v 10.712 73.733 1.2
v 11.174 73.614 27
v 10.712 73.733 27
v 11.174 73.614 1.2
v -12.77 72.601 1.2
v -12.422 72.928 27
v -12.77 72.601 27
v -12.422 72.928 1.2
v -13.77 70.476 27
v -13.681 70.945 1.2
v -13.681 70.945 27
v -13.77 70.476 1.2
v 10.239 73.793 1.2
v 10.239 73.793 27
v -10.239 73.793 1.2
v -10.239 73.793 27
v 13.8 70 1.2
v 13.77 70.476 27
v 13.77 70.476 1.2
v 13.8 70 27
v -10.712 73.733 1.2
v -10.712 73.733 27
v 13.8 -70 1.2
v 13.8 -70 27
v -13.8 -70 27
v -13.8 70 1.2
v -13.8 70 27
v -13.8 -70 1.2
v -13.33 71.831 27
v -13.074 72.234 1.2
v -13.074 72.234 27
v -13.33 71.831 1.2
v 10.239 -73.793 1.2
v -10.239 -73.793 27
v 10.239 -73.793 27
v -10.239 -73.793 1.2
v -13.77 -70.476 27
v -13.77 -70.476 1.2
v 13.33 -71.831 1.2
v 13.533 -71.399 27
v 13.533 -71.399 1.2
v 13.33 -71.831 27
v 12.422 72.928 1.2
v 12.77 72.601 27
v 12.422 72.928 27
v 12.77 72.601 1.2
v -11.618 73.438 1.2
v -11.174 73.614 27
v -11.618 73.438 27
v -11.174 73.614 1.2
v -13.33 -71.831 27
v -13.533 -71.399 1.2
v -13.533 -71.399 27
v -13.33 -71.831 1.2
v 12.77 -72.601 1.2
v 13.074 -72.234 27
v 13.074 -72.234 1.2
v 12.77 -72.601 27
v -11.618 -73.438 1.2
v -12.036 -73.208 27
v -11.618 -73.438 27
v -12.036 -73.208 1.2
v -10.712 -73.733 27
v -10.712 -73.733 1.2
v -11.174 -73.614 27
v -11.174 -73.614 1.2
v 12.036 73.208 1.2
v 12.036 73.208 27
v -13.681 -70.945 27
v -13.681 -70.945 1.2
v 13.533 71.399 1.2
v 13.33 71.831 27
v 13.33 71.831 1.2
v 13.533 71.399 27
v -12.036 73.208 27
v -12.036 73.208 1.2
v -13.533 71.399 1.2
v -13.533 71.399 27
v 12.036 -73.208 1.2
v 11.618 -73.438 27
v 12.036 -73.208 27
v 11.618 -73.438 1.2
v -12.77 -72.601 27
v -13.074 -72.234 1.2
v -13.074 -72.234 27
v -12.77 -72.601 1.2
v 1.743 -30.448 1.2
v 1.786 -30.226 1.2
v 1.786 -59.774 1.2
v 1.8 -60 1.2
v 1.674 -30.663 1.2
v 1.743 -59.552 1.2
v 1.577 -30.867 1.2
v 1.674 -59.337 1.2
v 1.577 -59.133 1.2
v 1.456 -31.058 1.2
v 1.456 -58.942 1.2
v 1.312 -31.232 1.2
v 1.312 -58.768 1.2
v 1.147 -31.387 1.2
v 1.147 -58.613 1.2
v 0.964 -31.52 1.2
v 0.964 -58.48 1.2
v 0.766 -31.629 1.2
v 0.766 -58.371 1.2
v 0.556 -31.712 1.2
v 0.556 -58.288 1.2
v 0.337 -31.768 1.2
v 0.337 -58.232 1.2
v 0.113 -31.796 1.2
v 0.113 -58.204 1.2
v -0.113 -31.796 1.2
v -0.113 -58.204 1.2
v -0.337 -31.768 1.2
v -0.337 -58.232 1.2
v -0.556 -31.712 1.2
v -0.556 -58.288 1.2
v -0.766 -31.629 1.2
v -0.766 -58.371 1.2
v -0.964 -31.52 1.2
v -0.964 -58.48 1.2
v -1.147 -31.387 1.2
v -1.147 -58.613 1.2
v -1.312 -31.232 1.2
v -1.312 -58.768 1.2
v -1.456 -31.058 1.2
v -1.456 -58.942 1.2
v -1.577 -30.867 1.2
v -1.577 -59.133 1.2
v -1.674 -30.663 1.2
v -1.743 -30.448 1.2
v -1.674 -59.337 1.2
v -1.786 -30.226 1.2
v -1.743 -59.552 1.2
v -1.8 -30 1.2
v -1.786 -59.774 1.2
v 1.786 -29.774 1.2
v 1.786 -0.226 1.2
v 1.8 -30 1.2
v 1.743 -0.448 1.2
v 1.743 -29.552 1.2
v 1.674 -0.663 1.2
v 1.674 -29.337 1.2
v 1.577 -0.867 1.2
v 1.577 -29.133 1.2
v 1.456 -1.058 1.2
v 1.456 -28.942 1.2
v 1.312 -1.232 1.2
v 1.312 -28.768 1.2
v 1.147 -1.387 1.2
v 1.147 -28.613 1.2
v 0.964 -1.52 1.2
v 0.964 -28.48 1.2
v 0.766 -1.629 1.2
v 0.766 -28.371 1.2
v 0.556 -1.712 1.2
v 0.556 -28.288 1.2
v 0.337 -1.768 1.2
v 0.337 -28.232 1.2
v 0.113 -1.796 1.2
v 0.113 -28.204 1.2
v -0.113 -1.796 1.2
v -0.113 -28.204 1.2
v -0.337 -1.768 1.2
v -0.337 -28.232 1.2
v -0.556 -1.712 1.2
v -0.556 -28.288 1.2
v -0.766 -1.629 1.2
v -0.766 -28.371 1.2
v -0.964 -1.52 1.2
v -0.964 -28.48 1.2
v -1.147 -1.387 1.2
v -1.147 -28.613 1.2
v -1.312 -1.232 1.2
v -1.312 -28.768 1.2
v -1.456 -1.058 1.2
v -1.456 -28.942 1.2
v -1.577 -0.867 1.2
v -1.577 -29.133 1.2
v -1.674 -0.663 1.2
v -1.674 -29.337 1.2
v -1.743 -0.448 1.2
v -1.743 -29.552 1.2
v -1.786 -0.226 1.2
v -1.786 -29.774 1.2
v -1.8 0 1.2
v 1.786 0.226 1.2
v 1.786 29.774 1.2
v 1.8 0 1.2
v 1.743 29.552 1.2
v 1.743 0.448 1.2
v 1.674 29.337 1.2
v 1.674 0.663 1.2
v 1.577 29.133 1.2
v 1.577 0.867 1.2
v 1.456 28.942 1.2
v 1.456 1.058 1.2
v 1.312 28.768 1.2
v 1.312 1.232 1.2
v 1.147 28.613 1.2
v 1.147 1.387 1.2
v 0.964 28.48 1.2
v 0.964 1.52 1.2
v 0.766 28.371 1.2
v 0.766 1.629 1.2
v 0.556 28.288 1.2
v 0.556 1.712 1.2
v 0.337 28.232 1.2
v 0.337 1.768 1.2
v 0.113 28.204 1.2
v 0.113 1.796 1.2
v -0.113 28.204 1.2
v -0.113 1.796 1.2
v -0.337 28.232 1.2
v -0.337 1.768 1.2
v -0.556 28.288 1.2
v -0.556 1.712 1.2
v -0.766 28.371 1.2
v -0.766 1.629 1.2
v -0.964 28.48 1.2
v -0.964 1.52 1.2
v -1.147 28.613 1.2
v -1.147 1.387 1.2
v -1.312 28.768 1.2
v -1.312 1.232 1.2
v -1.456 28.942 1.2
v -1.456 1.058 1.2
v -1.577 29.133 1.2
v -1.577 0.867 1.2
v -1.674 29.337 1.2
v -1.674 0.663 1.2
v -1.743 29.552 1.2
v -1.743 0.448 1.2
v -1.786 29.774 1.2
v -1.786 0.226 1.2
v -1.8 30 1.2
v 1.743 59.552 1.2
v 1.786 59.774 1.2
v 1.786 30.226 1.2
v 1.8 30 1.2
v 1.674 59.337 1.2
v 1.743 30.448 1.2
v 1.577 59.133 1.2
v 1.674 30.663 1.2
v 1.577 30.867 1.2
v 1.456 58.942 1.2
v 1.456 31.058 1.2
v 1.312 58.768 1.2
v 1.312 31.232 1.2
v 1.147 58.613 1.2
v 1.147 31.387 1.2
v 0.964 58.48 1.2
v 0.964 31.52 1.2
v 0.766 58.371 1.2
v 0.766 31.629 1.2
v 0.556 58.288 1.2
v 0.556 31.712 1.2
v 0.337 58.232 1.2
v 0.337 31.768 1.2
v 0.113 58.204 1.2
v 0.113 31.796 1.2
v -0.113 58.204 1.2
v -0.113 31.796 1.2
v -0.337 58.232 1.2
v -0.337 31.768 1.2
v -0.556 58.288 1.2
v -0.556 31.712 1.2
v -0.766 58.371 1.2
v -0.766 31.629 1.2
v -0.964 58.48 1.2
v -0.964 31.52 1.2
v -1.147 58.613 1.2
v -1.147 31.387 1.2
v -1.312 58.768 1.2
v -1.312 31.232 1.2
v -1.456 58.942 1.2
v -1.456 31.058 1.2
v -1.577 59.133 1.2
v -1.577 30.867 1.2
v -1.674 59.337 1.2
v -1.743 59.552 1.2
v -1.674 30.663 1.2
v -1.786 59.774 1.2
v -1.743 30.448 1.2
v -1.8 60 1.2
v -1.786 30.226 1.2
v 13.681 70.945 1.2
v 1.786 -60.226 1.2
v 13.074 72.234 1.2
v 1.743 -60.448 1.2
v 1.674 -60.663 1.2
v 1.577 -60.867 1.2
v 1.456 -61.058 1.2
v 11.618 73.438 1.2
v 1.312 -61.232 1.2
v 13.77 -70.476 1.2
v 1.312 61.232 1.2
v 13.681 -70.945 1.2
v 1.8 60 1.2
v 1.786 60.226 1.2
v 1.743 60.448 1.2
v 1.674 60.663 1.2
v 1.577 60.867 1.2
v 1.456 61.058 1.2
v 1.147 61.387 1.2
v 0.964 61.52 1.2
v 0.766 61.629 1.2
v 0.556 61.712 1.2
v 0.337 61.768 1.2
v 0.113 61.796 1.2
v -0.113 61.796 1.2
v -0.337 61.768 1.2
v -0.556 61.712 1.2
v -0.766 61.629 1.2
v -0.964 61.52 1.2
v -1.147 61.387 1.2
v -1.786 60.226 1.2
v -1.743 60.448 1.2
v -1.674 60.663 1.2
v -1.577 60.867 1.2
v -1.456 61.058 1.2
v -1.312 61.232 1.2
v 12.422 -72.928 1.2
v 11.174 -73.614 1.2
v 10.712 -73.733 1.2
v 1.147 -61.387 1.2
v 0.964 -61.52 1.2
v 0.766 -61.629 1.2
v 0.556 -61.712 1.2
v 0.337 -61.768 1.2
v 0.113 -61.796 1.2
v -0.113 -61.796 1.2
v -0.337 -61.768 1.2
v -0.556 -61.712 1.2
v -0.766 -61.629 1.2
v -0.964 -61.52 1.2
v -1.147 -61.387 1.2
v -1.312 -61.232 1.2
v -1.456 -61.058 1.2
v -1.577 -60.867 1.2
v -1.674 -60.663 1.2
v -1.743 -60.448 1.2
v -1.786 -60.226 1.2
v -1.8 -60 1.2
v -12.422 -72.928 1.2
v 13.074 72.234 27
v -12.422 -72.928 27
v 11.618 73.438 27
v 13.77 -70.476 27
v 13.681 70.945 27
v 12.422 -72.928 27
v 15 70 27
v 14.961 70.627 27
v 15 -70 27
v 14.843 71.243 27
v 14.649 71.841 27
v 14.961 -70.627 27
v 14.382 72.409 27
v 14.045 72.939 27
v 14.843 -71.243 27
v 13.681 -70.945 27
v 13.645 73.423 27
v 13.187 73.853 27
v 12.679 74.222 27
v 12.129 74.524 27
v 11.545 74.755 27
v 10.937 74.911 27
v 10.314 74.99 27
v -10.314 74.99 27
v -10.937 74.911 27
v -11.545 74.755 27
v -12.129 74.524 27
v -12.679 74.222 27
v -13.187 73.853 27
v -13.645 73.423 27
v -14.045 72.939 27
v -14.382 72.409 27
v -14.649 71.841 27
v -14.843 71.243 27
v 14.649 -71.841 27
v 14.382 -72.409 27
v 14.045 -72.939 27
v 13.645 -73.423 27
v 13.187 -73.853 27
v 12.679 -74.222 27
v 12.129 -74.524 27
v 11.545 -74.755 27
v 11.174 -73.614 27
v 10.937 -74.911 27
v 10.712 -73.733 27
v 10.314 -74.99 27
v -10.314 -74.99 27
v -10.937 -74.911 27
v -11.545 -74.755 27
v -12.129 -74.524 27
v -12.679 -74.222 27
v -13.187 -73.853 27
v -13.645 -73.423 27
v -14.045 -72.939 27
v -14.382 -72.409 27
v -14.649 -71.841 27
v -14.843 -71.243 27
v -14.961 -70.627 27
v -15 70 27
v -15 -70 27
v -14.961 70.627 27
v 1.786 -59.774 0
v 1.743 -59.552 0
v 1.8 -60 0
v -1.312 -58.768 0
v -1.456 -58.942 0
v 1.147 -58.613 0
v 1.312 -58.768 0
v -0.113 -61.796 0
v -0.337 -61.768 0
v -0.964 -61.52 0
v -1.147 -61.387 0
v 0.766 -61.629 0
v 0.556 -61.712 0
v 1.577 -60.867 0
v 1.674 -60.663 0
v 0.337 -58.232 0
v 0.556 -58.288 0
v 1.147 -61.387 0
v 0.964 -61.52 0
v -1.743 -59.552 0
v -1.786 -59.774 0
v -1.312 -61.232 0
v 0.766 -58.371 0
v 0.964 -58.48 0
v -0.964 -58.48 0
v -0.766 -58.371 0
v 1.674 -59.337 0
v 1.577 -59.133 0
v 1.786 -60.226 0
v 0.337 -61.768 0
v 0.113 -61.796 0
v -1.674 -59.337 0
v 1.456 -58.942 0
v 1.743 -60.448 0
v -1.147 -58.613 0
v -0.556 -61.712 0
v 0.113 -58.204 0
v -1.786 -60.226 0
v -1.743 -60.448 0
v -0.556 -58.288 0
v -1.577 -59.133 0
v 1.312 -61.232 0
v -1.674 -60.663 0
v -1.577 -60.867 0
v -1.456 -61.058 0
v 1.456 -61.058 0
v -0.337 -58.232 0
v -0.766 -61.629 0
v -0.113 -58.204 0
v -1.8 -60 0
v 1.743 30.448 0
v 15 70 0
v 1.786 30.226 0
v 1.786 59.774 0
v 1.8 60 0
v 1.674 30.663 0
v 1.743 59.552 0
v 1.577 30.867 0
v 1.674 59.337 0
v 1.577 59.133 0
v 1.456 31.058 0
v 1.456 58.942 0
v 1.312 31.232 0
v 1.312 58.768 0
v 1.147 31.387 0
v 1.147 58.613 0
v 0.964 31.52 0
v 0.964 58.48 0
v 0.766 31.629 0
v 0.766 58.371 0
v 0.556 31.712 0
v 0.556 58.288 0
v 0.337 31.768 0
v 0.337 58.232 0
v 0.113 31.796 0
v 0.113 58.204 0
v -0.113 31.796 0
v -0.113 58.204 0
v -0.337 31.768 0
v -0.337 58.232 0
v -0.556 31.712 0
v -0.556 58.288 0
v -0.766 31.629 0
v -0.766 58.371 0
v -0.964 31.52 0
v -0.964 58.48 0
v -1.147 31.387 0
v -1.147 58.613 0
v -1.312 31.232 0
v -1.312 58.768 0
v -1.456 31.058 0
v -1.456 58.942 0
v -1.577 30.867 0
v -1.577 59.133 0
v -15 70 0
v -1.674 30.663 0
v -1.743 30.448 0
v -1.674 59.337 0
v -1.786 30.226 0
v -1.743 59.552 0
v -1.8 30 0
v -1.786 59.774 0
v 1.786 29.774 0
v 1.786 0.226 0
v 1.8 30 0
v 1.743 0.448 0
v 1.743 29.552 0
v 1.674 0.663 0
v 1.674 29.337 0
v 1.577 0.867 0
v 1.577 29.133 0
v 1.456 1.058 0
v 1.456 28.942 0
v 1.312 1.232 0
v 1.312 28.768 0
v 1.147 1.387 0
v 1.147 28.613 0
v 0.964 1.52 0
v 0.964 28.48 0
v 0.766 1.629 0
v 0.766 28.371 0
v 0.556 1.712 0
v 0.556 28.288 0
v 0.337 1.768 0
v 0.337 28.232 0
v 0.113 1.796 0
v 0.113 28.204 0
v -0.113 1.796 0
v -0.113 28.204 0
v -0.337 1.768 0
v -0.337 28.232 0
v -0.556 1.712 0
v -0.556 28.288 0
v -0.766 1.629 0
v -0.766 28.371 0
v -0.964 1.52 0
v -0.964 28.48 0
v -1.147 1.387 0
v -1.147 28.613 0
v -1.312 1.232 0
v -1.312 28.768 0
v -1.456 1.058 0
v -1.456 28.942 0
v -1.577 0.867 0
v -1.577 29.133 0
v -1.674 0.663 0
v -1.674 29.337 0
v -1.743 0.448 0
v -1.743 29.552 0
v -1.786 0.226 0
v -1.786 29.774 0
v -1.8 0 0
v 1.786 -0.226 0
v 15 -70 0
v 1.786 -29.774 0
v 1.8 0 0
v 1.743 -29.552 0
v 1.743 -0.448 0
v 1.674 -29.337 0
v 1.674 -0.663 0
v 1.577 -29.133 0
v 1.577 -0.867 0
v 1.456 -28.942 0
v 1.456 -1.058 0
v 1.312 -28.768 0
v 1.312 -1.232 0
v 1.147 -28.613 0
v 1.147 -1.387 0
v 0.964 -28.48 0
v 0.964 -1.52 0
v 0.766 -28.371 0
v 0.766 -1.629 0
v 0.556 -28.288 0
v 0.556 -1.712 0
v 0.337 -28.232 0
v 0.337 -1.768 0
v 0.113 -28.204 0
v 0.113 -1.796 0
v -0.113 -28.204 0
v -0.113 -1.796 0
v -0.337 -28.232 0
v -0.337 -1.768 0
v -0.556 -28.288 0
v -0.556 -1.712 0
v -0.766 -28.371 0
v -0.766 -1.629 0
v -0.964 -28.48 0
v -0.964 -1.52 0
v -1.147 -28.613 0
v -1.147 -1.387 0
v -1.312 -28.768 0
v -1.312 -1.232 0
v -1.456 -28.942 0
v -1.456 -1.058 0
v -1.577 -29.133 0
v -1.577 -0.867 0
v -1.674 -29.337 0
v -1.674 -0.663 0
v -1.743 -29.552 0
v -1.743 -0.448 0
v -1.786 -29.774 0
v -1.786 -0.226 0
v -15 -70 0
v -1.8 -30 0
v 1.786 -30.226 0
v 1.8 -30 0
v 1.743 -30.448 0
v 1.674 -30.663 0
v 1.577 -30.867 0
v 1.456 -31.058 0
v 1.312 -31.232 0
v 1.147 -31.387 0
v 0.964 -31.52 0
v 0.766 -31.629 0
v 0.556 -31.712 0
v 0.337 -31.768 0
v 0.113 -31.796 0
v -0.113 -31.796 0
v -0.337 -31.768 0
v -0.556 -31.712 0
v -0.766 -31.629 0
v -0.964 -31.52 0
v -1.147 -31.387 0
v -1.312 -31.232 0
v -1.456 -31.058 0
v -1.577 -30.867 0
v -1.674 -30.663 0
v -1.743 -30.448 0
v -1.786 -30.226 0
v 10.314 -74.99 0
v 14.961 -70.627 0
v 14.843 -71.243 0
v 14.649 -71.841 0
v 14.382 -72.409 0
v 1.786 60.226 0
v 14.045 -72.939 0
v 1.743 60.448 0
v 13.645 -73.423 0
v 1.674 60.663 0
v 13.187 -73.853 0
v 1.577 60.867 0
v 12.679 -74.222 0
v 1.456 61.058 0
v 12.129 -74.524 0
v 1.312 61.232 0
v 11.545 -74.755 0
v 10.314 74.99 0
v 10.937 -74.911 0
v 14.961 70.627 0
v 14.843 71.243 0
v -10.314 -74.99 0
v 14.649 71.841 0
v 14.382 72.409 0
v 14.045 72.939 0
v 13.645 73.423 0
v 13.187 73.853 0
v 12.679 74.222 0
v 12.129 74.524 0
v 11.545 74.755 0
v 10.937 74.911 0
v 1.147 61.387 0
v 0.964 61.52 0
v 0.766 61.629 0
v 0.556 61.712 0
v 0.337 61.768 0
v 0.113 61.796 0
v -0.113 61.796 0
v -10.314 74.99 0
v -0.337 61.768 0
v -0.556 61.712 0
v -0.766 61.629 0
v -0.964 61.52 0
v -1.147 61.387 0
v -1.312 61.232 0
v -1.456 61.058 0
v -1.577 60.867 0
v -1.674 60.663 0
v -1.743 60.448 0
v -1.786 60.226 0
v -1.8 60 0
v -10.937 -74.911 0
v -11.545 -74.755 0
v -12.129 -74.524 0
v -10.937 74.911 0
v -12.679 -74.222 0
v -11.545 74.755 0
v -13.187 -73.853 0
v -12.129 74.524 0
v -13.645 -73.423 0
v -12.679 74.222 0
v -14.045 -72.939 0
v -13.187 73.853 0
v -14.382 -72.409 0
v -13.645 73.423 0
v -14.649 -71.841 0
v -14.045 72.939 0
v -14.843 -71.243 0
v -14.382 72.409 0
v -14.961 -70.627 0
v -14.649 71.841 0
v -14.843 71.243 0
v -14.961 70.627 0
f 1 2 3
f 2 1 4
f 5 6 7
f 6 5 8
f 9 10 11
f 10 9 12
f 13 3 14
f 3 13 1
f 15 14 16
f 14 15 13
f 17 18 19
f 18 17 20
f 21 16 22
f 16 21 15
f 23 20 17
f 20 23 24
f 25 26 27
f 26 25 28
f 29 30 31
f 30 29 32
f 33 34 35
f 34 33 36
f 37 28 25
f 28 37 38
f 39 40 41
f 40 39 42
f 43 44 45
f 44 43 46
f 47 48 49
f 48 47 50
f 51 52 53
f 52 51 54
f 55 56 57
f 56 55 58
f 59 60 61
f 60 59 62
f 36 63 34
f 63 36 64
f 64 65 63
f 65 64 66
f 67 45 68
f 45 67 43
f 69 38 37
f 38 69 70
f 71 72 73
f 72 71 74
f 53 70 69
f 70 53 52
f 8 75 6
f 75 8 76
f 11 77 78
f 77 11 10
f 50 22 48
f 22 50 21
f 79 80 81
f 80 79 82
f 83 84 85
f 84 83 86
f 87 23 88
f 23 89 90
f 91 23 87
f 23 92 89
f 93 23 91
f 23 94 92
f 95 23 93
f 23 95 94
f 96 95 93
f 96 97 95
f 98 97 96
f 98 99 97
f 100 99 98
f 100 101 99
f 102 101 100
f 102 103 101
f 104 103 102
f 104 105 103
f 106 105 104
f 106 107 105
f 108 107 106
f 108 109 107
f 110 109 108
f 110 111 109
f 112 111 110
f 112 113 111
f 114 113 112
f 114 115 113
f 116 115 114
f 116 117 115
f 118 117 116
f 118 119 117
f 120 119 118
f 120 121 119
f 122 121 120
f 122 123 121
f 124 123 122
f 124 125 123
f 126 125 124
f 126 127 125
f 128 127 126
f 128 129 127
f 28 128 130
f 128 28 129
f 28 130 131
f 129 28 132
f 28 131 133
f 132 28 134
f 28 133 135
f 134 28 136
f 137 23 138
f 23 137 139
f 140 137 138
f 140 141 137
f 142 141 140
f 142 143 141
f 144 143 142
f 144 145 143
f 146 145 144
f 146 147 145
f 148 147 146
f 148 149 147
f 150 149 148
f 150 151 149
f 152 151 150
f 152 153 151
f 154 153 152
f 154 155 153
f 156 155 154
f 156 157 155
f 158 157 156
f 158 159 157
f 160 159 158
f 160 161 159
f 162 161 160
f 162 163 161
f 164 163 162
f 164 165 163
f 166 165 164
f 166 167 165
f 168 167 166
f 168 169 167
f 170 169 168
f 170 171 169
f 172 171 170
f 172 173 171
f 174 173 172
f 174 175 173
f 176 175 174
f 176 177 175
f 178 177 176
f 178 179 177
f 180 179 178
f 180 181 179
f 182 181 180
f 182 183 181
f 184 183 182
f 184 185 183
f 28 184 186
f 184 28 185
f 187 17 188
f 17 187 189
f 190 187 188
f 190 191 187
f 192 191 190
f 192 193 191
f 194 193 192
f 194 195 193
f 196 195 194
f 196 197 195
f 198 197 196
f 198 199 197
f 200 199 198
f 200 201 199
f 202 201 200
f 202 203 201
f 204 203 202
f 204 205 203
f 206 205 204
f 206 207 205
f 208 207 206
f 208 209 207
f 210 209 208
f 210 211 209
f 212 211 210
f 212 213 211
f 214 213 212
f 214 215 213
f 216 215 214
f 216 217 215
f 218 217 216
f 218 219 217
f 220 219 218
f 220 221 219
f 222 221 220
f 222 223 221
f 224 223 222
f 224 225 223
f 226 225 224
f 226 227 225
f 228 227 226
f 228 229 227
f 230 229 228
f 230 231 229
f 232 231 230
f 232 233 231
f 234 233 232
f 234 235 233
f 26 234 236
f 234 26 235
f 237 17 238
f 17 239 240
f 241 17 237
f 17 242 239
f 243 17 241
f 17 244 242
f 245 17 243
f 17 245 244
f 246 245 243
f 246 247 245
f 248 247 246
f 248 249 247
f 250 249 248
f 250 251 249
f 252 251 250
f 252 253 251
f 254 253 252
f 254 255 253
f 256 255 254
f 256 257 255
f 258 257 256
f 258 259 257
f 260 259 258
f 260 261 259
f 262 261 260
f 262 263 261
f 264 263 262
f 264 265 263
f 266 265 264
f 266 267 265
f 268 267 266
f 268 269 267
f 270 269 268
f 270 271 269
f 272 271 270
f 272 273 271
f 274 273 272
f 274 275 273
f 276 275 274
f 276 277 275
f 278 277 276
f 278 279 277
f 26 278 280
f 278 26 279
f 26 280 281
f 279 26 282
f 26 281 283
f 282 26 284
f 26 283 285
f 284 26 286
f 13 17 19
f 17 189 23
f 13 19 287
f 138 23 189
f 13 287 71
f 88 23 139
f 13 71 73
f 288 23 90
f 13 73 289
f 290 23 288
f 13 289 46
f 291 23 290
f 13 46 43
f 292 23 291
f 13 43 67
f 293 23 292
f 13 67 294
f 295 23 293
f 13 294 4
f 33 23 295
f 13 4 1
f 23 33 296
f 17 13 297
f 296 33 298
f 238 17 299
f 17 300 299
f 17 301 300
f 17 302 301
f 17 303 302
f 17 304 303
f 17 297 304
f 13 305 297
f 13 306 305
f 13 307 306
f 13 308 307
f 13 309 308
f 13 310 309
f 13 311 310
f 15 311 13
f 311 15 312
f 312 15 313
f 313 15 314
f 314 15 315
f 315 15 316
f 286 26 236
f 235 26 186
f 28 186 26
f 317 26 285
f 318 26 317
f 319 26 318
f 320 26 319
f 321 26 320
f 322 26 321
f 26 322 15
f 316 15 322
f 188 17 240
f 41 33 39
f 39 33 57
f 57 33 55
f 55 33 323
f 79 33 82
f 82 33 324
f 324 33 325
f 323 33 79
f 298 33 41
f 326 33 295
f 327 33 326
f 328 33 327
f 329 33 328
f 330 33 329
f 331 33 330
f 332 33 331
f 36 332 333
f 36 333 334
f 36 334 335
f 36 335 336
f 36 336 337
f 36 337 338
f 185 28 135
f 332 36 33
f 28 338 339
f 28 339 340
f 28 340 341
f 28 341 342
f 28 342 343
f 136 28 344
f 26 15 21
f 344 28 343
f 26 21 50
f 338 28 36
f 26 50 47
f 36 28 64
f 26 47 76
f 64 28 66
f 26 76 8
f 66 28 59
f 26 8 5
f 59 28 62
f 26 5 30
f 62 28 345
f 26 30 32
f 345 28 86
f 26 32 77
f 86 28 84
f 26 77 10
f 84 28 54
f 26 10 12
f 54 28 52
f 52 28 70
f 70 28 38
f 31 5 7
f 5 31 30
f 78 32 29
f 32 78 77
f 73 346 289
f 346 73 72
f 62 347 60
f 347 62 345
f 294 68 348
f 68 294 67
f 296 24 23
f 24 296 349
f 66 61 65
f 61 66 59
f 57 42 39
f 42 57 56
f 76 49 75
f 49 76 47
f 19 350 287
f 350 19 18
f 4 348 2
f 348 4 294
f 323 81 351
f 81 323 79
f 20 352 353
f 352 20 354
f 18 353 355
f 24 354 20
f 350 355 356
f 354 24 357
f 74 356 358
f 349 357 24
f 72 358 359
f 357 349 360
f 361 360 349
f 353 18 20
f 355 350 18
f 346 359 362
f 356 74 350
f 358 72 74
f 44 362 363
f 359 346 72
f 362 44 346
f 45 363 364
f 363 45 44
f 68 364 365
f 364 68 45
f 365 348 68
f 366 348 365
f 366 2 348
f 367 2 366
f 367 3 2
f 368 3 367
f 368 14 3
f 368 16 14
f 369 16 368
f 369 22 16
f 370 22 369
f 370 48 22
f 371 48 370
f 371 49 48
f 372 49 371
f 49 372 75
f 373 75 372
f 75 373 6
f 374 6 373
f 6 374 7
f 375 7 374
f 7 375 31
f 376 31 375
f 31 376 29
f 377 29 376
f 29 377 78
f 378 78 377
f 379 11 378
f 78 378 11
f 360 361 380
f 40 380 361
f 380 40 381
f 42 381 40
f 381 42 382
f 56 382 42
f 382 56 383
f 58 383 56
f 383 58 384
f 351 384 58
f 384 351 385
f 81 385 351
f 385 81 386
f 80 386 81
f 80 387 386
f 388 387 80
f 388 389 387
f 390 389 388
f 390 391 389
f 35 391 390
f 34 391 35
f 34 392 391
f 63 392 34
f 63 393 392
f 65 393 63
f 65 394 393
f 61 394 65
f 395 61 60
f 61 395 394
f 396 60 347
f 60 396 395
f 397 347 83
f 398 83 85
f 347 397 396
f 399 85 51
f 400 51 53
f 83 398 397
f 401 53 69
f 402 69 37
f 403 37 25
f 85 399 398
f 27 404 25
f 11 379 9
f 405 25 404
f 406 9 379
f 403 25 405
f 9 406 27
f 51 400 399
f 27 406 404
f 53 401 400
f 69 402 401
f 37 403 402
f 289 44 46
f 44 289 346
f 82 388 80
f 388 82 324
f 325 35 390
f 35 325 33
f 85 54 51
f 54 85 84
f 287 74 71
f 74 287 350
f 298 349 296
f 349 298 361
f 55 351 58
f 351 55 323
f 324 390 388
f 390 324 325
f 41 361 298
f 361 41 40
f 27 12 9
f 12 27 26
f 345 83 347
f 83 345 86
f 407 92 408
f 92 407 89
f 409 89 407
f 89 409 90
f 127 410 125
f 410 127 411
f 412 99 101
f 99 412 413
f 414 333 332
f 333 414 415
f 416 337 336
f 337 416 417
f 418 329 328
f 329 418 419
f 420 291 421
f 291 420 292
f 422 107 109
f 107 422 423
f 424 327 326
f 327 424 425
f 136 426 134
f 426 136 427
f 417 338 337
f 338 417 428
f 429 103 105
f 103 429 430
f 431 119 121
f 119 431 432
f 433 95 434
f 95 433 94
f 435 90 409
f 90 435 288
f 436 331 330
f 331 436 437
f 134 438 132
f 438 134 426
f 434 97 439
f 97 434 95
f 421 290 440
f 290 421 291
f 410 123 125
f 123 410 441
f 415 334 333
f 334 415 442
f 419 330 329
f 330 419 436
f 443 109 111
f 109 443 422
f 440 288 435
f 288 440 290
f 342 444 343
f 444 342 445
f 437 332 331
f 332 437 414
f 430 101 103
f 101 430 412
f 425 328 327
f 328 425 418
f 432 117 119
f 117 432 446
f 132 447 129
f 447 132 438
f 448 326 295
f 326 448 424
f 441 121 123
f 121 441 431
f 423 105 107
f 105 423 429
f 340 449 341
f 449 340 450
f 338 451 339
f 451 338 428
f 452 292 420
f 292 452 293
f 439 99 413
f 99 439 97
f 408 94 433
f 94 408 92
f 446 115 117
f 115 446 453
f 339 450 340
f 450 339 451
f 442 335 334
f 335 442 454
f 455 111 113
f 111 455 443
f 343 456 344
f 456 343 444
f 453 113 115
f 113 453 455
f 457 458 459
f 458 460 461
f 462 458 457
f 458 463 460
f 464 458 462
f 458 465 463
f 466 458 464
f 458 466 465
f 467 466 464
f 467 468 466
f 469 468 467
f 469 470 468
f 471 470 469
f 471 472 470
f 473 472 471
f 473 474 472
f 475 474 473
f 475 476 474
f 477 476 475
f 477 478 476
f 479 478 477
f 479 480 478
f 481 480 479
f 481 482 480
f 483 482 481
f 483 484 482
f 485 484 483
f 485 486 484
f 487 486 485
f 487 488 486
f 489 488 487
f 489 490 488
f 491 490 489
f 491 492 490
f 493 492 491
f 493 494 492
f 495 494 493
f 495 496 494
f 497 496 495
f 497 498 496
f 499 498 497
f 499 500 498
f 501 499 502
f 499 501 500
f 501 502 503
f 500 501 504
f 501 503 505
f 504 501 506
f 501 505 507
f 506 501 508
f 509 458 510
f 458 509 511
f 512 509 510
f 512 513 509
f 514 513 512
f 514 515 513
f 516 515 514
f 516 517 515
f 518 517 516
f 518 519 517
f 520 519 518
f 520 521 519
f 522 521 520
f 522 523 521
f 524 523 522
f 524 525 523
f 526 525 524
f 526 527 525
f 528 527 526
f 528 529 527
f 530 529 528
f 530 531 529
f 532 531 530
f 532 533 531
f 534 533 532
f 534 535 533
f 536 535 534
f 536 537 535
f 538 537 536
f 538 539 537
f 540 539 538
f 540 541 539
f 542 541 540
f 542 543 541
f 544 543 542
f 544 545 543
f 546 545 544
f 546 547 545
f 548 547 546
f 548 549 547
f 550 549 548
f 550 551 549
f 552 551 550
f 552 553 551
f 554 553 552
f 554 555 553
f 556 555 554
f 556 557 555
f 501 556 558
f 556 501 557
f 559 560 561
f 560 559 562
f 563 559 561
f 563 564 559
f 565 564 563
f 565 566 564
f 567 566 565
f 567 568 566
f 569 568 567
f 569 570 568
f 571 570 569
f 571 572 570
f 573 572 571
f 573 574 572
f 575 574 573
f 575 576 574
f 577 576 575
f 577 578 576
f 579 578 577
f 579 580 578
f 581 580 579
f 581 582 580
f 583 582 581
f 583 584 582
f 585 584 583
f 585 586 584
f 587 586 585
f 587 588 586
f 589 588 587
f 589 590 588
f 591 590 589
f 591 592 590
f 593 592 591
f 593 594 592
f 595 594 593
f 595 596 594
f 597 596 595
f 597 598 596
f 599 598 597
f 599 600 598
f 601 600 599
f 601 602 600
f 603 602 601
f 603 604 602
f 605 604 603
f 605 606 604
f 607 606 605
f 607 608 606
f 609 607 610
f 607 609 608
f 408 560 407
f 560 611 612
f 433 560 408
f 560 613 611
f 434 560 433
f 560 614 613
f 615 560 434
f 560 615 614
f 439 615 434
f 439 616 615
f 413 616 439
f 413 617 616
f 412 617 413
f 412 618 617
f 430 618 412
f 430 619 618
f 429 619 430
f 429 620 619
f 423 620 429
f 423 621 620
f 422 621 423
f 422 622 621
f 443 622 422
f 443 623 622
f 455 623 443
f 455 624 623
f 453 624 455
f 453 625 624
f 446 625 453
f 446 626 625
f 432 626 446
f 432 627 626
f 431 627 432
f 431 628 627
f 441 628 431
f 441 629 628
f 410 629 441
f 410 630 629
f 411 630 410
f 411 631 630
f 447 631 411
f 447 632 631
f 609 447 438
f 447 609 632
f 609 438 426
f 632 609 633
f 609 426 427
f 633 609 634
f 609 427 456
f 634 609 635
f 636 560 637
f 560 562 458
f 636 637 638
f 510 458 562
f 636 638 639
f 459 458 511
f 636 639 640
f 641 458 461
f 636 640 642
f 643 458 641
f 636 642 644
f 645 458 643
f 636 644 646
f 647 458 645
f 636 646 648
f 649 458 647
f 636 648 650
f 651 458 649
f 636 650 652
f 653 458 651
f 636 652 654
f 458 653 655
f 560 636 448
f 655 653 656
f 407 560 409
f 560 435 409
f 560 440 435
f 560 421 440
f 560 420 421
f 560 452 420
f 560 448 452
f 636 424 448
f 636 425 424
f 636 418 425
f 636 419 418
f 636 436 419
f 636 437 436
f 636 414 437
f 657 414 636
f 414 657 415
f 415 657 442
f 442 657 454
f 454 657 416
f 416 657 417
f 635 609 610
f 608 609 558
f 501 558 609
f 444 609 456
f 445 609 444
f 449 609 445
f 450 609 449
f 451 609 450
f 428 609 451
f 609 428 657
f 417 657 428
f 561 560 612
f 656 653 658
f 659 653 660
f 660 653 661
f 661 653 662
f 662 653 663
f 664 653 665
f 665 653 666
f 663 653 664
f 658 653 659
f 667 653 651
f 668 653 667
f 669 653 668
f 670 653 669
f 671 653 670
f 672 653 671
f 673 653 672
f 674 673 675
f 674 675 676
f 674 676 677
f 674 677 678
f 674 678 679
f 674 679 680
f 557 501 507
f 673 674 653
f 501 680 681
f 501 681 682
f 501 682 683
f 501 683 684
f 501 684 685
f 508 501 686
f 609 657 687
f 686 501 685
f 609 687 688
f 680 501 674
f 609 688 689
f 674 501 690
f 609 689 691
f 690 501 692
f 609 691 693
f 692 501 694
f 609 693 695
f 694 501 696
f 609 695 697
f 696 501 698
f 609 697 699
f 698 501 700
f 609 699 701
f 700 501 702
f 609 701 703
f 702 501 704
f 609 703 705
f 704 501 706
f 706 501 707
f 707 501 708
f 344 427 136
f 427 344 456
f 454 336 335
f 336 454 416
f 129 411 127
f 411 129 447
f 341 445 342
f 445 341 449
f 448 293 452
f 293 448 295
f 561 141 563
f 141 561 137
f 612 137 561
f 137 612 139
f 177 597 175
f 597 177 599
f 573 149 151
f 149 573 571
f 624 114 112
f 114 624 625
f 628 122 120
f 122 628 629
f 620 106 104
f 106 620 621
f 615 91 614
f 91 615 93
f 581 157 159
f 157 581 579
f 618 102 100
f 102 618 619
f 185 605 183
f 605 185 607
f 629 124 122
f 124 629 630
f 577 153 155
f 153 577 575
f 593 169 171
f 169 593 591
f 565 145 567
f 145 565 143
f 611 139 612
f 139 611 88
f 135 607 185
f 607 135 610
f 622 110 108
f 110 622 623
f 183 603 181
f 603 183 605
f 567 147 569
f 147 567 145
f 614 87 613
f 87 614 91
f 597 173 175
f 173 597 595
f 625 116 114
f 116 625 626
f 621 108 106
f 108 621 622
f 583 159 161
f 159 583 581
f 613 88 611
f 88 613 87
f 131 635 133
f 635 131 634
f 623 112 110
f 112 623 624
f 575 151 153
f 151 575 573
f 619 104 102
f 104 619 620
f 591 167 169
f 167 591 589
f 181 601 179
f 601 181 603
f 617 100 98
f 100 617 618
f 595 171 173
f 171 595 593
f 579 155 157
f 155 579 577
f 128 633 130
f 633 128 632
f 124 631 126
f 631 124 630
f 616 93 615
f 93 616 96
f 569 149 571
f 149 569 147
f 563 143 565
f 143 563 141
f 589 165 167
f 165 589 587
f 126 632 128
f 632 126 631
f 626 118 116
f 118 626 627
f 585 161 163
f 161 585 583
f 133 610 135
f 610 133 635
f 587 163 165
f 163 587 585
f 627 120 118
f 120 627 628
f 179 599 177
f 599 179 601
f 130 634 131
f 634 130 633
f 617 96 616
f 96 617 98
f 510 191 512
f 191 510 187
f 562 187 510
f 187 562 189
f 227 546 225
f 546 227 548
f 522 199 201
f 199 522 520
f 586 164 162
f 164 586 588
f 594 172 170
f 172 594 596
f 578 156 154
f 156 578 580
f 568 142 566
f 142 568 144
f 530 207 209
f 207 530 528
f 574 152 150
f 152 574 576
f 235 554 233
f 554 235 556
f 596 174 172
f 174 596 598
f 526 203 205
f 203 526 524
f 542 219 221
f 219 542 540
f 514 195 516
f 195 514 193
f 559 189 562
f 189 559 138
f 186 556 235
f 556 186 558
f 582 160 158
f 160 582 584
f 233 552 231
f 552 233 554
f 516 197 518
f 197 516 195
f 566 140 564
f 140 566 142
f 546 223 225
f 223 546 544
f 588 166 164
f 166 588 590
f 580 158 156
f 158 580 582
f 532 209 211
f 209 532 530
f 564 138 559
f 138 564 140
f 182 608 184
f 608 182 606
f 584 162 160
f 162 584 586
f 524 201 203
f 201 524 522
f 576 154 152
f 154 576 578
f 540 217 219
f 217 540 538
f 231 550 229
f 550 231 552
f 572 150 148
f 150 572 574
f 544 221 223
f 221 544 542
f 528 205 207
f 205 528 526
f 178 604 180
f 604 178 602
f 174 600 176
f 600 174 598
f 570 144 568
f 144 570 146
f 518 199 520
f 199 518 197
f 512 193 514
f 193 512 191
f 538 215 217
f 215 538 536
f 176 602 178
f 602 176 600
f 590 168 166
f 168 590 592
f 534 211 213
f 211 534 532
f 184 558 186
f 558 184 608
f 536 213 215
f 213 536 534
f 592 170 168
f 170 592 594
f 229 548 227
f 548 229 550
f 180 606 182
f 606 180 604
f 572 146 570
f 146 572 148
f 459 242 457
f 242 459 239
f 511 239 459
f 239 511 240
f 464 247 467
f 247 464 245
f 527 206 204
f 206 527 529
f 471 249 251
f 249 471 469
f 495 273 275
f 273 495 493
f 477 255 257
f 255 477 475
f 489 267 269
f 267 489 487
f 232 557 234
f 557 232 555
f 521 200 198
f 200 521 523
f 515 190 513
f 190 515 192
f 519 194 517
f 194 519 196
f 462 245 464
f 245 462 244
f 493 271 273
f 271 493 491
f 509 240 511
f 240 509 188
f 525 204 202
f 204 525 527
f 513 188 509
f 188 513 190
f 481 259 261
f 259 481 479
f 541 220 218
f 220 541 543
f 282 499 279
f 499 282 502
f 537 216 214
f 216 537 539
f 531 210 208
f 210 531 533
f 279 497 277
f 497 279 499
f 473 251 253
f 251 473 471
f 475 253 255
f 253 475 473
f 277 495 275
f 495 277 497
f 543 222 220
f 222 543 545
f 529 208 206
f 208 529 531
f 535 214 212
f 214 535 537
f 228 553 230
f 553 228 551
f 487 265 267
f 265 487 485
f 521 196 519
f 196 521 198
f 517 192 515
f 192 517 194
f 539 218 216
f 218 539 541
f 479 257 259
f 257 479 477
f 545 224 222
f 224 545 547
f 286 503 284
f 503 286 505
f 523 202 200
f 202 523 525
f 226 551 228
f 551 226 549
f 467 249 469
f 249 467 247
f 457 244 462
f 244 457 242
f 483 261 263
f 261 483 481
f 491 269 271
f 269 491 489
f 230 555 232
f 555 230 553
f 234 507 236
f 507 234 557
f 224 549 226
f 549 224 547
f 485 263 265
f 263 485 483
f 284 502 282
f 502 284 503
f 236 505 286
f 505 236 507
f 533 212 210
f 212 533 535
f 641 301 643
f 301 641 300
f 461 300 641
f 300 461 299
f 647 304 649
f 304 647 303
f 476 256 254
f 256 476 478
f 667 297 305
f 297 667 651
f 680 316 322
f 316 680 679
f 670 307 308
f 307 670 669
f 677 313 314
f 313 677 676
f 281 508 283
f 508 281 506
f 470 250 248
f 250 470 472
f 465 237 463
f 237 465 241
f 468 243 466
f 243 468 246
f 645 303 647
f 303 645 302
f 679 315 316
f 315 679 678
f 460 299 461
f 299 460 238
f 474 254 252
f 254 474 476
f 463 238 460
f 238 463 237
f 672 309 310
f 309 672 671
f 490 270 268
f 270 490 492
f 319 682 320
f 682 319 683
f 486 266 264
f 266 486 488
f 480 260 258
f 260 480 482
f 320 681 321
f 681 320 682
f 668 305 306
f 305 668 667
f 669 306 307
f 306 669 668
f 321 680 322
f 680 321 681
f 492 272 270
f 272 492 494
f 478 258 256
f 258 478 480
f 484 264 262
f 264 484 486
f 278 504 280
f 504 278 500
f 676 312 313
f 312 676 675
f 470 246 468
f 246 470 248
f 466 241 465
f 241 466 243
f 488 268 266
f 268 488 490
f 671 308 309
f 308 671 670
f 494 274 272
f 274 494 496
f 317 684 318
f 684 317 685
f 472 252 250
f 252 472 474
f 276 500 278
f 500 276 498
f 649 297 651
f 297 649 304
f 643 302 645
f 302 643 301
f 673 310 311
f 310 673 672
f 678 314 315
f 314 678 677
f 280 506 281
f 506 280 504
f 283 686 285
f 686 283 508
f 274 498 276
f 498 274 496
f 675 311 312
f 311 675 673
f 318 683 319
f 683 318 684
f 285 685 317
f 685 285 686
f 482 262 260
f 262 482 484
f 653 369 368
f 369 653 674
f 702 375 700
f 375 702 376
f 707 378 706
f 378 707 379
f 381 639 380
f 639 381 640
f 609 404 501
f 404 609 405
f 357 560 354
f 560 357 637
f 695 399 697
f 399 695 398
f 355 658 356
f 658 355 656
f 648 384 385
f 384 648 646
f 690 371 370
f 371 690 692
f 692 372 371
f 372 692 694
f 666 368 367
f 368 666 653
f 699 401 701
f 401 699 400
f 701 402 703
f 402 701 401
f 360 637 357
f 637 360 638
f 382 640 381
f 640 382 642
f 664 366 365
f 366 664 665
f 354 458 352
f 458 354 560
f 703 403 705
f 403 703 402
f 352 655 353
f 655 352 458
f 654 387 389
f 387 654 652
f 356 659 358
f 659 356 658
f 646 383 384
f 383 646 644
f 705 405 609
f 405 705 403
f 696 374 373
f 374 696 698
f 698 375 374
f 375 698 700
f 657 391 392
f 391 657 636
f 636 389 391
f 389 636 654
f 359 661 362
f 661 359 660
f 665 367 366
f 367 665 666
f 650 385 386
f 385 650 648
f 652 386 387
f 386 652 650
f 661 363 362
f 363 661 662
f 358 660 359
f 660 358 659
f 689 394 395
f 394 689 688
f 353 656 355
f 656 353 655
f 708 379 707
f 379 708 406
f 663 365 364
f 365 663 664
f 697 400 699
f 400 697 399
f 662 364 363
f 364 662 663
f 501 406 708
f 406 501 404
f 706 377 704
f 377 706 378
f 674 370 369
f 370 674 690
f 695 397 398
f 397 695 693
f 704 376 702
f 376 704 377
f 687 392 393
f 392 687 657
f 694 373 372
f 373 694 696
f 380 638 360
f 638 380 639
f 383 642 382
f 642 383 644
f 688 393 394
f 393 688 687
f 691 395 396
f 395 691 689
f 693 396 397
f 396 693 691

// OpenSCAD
$fn = 50;


difference() {
	union() {
		hull() {
			translate(v = [-10.0000000000, 70.0000000000, 0]) {
				cylinder(h = 27, r = 5);
			}
			translate(v = [10.0000000000, 70.0000000000, 0]) {
				cylinder(h = 27, r = 5);
			}
			translate(v = [-10.0000000000, -70.0000000000, 0]) {
				cylinder(h = 27, r = 5);
			}
			translate(v = [10.0000000000, -70.0000000000, 0]) {
				cylinder(h = 27, r = 5);
			}
		}
	}
	union() {
		translate(v = [0, 0, 1.2000000000]) {
			hull() {
				translate(v = [-10.0000000000, 70.0000000000, 0]) {
					cylinder(h = 25.8000000000, r = 3.8000000000);
				}
				translate(v = [10.0000000000, 70.0000000000, 0]) {
					cylinder(h = 25.8000000000, r = 3.8000000000);
				}
				translate(v = [-10.0000000000, -70.0000000000, 0]) {
					cylinder(h = 25.8000000000, r = 3.8000000000);
				}
				translate(v = [10.0000000000, -70.0000000000, 0]) {
					cylinder(h = 25.8000000000, r = 3.8000000000);
				}
			}
		}
		#translate(v = [0.0000000000, -60.0000000000, 0]) {
			cylinder(h = 1.2000000000, r = 1.8000000000);
		}
		#translate(v = [0.0000000000, -30.0000000000, 0]) {
			cylinder(h = 1.2000000000, r = 1.8000000000);
		}
		#cylinder(h = 1.2000000000, r = 1.8000000000);
		#translate(v = [0.0000000000, 30.0000000000, 0]) {
			cylinder(h = 1.2000000000, r = 1.8000000000);
		}
		#translate(v = [0.0000000000, 60.0000000000, 0]) {
			cylinder(h = 1.2000000000, r = 1.8000000000);
		}
	}
}
